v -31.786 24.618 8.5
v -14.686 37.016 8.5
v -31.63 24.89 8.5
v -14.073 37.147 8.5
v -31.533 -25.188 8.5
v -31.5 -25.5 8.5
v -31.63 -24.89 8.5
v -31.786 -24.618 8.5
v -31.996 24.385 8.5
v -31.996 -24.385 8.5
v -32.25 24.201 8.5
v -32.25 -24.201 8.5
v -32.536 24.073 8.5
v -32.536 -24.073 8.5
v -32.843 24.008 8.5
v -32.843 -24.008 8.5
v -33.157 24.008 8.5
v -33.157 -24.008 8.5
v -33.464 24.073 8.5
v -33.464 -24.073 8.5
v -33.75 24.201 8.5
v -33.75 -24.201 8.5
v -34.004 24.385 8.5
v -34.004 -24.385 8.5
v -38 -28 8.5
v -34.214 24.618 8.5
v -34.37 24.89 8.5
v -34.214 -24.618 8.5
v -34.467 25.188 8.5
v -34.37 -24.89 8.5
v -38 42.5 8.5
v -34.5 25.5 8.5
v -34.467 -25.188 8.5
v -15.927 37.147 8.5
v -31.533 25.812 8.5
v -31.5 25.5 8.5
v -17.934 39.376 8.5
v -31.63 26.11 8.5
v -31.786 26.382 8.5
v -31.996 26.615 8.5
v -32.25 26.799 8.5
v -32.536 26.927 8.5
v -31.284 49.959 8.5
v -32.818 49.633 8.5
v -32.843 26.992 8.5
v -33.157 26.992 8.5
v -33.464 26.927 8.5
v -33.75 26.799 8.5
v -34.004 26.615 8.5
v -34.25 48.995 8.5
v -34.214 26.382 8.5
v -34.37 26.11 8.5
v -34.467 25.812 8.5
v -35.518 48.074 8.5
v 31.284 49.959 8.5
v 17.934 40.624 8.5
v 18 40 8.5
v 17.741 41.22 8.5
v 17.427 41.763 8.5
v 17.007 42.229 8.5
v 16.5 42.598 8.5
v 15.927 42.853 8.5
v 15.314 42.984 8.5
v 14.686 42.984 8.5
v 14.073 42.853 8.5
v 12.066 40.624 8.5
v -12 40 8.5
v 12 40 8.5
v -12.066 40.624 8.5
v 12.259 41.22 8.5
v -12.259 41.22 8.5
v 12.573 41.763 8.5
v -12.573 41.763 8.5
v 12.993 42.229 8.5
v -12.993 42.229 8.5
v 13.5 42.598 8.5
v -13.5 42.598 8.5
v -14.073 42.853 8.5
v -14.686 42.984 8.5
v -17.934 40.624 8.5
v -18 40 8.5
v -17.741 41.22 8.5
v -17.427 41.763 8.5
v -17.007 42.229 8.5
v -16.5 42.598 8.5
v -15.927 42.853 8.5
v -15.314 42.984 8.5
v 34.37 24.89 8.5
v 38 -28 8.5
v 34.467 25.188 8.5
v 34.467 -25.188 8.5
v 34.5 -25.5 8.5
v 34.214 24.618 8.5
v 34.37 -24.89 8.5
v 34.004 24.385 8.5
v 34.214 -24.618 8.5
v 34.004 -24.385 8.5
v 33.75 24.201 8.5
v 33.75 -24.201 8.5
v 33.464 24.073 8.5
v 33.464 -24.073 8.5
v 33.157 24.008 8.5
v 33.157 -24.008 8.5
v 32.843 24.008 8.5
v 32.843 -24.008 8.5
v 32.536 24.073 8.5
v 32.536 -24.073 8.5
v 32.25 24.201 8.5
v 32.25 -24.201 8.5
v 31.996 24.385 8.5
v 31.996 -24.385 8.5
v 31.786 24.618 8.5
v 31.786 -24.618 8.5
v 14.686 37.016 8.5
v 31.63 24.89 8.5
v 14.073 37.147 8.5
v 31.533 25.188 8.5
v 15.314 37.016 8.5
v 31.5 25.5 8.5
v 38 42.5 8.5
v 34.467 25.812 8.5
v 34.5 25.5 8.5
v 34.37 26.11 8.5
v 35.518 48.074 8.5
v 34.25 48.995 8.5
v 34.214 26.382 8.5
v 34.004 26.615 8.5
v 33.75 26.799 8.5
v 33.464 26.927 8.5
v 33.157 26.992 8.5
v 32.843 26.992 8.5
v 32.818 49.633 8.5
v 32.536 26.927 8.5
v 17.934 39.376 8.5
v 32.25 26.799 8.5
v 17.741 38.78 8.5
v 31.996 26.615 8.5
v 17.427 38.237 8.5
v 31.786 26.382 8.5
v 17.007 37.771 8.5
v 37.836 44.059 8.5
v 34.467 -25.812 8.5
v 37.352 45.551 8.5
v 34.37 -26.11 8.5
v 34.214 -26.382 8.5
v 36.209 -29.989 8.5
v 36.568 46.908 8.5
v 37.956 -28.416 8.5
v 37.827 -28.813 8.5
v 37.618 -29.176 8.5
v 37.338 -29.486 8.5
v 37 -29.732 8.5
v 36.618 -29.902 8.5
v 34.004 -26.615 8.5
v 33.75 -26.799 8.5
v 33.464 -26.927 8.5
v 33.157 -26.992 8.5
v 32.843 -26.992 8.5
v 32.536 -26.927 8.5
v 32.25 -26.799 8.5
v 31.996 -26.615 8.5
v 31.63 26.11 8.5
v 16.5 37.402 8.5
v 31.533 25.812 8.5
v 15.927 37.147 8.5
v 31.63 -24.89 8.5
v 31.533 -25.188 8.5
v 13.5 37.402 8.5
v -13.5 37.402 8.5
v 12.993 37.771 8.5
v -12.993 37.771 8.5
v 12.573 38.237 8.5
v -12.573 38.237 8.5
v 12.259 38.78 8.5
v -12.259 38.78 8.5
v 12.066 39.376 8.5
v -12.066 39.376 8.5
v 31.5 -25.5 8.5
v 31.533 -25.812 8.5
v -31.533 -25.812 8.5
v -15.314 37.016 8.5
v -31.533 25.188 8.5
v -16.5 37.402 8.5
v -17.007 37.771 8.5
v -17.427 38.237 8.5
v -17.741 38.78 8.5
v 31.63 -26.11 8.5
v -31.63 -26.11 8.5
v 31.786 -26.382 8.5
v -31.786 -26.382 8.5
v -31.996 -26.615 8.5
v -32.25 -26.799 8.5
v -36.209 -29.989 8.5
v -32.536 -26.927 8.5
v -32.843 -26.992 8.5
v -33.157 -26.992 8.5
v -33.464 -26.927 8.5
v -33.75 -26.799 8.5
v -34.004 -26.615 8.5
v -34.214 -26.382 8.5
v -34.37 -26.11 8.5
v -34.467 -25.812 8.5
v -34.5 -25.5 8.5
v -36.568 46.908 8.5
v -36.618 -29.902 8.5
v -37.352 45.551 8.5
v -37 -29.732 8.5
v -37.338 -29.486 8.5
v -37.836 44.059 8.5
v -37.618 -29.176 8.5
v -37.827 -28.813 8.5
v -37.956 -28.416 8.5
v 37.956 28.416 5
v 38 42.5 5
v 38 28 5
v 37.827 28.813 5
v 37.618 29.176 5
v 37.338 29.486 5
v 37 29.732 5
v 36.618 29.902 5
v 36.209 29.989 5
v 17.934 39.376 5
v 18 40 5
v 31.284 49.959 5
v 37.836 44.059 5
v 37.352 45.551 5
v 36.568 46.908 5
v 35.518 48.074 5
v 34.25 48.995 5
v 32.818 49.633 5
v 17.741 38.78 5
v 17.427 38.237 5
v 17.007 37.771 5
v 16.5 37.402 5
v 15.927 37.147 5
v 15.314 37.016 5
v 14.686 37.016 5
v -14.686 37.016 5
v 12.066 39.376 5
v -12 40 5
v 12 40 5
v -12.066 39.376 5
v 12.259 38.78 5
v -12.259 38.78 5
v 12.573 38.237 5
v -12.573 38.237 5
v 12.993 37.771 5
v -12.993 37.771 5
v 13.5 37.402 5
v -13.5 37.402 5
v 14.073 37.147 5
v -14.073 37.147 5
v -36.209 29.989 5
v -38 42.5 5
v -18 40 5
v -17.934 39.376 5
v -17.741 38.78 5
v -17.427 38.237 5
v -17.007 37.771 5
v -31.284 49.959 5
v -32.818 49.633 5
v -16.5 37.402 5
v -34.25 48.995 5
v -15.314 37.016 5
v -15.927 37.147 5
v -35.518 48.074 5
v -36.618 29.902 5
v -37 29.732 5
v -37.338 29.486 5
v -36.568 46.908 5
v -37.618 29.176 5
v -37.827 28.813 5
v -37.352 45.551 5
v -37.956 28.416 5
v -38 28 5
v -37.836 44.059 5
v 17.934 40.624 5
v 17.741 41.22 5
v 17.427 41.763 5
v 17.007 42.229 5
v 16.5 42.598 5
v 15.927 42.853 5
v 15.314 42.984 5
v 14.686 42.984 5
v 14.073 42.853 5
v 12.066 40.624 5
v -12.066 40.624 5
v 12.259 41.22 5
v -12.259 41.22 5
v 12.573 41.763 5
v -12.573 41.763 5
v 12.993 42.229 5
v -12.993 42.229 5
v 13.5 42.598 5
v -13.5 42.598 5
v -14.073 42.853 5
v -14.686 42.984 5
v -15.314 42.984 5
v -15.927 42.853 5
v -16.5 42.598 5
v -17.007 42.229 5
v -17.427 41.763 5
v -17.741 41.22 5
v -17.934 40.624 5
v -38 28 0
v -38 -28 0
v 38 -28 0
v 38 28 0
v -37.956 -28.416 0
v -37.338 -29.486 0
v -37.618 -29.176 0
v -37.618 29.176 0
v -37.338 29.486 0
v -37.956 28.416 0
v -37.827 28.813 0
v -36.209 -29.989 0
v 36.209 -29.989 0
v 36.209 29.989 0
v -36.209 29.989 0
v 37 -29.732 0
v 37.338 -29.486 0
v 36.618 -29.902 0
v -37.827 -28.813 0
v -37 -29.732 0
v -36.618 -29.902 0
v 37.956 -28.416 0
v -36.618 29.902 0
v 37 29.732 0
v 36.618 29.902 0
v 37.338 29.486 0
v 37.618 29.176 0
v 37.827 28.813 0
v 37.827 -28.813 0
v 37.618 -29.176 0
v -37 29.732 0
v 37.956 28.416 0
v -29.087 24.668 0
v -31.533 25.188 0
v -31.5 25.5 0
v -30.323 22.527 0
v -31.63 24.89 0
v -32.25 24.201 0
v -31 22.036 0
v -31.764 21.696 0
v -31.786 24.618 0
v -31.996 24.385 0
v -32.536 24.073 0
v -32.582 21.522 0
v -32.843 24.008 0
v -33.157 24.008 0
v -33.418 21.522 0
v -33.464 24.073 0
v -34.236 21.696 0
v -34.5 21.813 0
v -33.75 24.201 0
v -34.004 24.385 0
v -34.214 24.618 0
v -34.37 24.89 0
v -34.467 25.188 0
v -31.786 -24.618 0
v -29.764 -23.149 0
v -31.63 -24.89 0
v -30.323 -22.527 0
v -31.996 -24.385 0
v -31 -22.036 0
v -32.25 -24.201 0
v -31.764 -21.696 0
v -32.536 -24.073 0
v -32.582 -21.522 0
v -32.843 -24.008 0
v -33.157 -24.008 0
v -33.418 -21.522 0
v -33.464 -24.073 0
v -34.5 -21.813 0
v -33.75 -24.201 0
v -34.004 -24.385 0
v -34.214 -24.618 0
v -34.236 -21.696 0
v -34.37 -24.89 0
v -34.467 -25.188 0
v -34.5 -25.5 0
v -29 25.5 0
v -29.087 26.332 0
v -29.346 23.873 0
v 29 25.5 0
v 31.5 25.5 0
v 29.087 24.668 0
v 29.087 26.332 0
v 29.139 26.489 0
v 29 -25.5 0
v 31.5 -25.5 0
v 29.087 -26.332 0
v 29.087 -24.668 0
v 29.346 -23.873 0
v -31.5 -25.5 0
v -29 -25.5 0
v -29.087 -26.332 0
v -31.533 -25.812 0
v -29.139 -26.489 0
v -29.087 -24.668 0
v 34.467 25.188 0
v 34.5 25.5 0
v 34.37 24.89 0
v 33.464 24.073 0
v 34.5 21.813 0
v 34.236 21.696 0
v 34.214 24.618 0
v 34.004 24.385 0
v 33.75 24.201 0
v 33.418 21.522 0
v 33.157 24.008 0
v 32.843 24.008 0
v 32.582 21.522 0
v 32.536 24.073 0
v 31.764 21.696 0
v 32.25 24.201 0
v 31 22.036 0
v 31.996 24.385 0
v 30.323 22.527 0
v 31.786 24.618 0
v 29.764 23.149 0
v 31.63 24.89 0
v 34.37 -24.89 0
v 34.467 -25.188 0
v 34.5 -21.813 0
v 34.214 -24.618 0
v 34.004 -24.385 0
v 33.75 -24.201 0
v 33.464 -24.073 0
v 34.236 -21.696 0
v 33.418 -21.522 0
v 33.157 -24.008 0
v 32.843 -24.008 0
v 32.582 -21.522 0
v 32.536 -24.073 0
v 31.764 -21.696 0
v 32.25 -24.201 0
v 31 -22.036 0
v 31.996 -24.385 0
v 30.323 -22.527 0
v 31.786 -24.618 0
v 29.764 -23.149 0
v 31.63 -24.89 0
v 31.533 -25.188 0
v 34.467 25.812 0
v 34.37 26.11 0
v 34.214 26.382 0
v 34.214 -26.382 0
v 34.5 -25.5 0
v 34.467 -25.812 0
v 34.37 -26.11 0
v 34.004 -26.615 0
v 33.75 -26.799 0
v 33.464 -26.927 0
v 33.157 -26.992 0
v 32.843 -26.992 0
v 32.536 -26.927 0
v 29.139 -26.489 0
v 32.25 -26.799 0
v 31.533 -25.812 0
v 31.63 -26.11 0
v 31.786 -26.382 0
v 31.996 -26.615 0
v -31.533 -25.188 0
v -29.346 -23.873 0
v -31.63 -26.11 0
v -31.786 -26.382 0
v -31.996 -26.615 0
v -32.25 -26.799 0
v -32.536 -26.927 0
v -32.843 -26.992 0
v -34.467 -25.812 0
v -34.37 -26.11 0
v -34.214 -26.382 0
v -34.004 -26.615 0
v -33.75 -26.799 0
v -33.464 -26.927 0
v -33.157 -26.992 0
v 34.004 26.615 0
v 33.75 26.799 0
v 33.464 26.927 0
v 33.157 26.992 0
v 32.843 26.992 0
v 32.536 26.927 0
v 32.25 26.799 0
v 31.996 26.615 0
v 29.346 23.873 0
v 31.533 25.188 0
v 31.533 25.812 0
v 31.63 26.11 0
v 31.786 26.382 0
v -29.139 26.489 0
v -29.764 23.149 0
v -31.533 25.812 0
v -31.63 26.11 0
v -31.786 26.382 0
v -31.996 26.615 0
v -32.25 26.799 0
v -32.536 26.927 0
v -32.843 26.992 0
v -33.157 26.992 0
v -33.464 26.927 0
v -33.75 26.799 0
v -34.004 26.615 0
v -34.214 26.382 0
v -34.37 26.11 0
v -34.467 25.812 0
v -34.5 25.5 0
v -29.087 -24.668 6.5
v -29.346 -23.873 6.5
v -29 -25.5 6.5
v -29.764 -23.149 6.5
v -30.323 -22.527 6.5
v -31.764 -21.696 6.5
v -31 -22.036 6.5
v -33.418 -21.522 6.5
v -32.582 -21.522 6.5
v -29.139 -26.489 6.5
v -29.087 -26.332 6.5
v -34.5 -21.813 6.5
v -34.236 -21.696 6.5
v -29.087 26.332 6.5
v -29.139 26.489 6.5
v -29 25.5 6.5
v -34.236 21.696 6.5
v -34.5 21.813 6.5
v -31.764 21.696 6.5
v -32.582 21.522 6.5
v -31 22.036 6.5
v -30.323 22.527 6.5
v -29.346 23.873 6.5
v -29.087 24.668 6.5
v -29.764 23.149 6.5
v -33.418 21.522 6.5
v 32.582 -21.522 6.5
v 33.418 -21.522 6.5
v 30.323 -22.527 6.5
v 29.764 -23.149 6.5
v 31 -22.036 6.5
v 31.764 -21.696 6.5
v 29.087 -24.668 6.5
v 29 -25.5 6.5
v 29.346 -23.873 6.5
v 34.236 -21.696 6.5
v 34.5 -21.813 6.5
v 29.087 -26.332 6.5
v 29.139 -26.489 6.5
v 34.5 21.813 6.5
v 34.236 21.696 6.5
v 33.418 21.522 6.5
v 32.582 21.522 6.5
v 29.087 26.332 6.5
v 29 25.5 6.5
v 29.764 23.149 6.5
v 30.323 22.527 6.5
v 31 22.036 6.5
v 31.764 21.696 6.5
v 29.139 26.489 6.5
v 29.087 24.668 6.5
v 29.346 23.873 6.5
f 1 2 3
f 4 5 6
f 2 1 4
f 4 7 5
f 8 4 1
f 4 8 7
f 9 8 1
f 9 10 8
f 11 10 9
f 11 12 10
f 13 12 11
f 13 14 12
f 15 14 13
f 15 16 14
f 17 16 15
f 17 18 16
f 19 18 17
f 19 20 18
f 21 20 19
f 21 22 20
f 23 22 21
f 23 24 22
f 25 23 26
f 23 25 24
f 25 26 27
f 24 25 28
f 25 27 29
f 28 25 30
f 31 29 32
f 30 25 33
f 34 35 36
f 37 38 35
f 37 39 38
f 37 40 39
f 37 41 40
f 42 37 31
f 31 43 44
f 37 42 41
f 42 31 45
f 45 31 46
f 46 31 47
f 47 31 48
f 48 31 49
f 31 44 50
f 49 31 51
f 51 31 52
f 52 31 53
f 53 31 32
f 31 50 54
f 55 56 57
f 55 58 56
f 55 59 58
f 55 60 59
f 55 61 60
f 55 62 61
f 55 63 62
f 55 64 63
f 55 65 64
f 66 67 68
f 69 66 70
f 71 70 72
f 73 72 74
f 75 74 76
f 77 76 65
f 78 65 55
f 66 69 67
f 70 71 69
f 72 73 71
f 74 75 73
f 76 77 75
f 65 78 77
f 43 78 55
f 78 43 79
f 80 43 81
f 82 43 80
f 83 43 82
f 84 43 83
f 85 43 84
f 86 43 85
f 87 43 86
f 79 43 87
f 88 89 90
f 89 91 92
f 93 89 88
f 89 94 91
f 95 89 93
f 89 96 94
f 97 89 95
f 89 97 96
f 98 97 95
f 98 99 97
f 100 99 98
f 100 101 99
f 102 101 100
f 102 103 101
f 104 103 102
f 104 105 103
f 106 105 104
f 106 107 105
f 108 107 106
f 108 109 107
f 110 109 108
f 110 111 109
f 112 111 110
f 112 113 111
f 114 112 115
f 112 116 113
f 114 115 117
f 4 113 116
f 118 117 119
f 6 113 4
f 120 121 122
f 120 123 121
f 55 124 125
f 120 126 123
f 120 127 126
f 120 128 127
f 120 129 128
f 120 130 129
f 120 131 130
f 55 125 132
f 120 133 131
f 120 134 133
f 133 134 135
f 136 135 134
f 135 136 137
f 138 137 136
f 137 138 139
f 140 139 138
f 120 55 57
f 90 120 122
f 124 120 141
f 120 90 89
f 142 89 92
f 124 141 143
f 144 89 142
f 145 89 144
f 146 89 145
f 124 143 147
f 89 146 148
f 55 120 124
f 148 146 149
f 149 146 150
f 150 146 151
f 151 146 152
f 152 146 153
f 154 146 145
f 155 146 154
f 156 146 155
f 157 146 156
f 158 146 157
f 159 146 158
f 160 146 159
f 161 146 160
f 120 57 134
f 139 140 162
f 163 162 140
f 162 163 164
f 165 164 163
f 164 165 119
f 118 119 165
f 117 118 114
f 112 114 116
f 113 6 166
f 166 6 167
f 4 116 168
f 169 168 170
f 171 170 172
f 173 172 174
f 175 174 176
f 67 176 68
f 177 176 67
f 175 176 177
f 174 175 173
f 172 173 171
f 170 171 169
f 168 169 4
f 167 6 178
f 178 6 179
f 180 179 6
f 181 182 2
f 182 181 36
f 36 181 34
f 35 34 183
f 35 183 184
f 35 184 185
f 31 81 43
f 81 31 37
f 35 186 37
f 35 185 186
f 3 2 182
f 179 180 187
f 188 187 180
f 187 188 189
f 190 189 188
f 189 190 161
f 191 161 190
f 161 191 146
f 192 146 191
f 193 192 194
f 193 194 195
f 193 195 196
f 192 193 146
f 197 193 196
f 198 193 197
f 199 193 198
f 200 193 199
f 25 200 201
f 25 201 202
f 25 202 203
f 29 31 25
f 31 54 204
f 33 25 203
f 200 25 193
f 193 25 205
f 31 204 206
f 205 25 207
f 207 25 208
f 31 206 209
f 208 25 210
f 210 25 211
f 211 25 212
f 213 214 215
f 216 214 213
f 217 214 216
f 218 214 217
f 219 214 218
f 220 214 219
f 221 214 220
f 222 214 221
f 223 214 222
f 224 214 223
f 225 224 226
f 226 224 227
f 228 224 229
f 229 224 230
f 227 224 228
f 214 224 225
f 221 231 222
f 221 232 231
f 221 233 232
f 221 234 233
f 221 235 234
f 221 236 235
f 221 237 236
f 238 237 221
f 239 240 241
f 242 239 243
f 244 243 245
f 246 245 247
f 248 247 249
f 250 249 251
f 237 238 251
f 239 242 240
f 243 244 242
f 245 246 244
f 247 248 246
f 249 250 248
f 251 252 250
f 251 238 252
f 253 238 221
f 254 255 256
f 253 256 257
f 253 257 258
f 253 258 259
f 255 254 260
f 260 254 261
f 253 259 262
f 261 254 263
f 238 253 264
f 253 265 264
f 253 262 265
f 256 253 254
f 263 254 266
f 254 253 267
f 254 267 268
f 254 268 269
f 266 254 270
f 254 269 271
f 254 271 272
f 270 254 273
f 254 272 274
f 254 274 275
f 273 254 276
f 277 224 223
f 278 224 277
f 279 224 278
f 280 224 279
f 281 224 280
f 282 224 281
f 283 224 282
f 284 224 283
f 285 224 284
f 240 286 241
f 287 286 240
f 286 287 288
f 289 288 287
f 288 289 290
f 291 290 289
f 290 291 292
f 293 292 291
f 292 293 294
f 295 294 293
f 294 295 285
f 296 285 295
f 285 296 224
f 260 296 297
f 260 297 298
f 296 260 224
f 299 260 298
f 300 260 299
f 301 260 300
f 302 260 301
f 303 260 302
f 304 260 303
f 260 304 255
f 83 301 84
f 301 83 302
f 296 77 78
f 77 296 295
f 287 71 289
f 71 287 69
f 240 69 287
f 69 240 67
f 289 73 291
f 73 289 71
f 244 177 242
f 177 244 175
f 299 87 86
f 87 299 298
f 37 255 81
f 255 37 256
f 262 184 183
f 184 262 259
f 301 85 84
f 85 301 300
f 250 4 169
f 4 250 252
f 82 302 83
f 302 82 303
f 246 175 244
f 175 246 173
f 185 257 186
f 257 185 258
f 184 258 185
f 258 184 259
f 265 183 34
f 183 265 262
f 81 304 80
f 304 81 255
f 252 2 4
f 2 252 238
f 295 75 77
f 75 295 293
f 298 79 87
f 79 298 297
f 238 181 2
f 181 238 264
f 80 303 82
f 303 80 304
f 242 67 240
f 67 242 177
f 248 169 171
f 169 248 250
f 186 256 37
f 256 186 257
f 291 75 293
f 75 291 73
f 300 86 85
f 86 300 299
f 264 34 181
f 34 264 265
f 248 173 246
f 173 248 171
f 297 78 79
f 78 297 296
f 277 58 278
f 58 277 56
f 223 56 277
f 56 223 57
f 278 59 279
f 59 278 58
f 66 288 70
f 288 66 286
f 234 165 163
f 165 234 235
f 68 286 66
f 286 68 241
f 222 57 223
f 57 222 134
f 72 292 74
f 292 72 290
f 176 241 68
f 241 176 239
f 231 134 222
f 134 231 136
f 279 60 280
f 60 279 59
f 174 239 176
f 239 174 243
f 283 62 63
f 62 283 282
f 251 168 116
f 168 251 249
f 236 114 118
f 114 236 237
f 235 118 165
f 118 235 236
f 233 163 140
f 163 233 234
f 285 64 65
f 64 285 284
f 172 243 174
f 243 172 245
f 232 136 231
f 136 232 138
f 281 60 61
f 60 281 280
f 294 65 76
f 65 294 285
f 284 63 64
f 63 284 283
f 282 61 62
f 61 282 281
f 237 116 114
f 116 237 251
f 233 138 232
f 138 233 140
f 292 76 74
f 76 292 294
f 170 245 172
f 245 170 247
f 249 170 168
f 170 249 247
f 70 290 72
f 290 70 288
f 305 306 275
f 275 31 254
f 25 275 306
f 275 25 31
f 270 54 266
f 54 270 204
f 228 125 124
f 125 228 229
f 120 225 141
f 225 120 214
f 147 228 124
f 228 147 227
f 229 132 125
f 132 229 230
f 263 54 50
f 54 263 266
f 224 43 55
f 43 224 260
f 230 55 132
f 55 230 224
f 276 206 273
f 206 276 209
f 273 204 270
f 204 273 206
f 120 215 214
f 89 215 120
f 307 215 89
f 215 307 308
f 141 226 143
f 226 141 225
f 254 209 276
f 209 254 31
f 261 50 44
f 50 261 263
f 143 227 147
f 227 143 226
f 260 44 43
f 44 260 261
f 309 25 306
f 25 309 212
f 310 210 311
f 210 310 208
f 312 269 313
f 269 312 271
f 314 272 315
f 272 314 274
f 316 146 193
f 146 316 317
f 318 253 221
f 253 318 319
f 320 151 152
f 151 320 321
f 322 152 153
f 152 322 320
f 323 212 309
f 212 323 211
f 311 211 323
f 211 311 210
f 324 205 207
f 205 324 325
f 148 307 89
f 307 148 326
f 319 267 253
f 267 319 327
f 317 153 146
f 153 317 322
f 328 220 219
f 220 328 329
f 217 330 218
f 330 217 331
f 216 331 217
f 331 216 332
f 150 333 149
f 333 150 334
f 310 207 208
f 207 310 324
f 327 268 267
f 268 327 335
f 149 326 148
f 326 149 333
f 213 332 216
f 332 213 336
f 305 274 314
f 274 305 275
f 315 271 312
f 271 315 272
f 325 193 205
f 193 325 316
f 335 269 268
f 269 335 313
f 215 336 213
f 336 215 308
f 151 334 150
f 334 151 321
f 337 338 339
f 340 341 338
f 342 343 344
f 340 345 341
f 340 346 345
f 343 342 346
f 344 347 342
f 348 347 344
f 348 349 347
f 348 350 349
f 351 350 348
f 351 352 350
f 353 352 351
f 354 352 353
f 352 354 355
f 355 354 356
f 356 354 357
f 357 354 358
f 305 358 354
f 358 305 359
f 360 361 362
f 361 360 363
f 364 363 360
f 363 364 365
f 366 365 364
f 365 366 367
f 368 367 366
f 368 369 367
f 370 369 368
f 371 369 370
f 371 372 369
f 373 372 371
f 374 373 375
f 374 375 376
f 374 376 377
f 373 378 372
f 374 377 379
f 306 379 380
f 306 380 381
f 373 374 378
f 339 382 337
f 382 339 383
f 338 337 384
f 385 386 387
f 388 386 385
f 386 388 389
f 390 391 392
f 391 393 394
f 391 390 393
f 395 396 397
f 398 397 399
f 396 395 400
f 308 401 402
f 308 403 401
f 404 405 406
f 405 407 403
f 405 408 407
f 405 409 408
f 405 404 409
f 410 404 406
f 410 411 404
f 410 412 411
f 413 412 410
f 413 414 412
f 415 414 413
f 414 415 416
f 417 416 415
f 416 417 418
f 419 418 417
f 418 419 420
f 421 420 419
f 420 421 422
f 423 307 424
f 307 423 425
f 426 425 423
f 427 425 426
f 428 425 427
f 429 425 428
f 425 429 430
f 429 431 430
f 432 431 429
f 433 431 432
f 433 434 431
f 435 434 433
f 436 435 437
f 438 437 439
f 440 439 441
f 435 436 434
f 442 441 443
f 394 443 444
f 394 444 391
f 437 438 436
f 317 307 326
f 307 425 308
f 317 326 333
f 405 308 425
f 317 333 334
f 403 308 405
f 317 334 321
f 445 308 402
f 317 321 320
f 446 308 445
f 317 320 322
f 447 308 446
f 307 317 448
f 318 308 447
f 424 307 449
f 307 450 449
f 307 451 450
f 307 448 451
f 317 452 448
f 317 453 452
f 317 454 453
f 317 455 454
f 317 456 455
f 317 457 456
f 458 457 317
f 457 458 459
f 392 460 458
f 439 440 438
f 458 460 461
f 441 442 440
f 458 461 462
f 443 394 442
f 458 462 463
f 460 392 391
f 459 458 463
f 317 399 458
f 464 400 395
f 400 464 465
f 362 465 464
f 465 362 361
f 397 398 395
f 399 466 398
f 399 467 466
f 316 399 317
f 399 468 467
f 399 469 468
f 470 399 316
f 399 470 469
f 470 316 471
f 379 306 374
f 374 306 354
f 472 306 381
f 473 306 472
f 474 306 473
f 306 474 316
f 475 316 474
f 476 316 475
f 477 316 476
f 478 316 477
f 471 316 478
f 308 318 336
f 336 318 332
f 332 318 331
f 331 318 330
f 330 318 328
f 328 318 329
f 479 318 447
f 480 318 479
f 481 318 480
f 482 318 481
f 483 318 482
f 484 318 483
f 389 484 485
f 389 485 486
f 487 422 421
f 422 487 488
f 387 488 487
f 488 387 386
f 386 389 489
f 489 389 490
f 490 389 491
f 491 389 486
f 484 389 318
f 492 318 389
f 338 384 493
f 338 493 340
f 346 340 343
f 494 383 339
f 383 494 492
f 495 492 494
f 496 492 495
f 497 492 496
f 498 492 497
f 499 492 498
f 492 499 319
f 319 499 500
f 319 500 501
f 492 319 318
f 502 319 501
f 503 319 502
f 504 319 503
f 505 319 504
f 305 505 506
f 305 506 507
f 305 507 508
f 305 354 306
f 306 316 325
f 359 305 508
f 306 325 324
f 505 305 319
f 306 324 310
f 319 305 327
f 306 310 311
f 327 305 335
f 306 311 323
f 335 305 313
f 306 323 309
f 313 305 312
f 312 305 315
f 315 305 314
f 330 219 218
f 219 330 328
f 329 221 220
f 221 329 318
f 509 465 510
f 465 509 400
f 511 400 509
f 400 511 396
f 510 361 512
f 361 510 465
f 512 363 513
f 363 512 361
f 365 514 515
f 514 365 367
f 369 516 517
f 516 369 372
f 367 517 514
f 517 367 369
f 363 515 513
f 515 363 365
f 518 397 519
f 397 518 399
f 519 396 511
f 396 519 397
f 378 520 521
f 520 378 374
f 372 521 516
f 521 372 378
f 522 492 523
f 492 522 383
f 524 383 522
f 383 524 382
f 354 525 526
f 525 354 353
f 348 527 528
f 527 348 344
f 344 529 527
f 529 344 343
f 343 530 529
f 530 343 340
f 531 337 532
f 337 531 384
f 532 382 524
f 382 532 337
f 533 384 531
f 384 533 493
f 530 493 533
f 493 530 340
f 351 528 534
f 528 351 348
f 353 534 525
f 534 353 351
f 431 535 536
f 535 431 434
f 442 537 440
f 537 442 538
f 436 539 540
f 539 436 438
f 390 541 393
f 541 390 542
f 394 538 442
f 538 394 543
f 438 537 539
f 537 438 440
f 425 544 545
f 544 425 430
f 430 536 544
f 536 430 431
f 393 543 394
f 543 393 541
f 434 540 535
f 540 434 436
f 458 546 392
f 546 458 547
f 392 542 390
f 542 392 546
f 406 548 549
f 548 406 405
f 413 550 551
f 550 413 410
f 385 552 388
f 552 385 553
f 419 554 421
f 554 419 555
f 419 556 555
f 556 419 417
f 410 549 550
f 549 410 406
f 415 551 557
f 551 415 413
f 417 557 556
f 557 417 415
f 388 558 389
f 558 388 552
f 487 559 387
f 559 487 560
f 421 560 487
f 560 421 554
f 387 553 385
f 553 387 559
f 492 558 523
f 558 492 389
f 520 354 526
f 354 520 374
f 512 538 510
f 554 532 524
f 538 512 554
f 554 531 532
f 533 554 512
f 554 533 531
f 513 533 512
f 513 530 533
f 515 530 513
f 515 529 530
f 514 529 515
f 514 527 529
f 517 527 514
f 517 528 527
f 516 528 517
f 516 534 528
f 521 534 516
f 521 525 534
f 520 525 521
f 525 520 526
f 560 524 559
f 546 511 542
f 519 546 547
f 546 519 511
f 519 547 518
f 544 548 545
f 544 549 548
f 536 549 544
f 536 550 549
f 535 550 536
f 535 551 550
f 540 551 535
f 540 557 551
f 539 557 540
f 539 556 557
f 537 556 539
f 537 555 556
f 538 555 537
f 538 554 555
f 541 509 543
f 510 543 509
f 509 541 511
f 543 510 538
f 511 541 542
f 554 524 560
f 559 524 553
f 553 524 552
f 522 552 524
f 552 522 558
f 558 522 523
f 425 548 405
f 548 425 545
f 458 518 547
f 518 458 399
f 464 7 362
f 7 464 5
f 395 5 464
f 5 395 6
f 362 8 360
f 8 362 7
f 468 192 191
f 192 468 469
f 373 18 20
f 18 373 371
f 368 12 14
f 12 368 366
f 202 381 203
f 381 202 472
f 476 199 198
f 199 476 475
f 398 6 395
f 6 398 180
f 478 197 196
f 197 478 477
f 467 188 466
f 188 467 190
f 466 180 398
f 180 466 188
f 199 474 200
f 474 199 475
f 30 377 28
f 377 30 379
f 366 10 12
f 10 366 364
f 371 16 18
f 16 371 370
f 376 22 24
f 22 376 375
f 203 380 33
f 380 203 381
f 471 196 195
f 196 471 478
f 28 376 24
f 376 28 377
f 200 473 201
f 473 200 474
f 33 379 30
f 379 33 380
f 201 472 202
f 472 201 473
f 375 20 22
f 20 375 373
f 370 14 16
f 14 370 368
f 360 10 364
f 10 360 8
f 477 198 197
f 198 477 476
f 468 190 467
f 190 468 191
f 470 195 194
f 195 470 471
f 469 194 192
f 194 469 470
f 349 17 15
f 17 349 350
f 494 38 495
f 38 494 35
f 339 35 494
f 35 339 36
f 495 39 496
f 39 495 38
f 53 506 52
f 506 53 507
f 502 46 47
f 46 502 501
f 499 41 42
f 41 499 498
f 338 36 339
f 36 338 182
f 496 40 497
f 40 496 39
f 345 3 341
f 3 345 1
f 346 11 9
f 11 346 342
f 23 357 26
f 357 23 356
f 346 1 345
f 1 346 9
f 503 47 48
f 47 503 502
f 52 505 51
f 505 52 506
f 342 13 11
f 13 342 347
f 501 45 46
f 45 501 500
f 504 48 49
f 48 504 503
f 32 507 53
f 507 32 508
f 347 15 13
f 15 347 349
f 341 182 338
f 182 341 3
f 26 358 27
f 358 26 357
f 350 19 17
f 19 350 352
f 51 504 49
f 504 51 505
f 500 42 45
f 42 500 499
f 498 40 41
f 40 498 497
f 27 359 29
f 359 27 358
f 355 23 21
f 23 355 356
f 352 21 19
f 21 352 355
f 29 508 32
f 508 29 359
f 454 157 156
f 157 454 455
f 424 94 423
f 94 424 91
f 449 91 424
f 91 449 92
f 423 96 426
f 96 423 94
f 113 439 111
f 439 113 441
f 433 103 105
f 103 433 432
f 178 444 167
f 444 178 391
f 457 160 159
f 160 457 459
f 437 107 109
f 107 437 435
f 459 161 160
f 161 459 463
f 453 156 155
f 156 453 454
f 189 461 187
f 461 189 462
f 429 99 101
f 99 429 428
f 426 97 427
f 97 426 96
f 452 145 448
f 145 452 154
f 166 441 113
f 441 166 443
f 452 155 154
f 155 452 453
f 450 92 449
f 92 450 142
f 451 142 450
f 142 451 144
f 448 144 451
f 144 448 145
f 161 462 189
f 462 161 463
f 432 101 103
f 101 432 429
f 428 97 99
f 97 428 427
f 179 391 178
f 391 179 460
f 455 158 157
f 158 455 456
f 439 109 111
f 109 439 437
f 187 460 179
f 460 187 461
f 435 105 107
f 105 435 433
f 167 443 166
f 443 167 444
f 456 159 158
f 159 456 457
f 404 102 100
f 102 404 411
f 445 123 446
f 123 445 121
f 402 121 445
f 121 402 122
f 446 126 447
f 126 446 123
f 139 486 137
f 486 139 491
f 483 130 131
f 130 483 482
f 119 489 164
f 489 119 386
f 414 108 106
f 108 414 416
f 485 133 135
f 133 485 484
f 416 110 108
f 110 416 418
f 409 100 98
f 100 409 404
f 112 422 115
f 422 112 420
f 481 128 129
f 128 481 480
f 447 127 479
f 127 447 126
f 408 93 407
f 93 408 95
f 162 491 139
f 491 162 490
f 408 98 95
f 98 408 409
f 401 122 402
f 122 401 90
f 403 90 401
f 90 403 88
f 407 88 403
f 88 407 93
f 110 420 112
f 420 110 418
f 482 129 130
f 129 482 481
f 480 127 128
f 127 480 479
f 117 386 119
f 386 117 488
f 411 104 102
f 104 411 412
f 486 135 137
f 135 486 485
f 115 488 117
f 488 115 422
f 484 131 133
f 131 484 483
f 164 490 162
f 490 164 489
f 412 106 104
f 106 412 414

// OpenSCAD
WIDTH = 76;
LENGTH = 60;
DEPTH = 8.5;

CORNER_DIA = 4;

WALL_THICKNESS = 3.5;
SIDE_THICKNESS = 2;

HOLE_SPACING_X = 66;
HOLE_SPACING_Y = 51;
HOLE_DIA = 3;
HOLE_SUPPORT_DIA = 8;

IEC_WIDTH = 21;
IEC_LENGTH = 26;
IEC_OFFSET_X = 22;
IEC_OFFSET_Y = 8;

ONOFF_WIDTH = 20;
ONOFF_LENGTH = 12;
ONOFF_OFFSET_X = 22;
ONOFF_OFFSET_Y = -16;

FUSE_DIA = 15;
FUSE_OFFSET_X = -22;
FUSE_OFFSET_Y = 13;

CABLE_DIA = 15;
CABLE_OFFSET_X = -22;
CABLE_OFFSET_Y = -13;

TAB_DEPTH = WALL_THICKNESS;
TAB_WIDTH = 20;
TAB_LENGTH = WIDTH;
TAB_CORNER_DIA = 15;

TAB_HOLE_SPACING_X = 30;
TAB_HOLE_SPACING_Y = 10;
TAB_HOLE_DIA = 6;

$fn = 30;

module mount_holes(w, l, h, dia) {
    for(i = [-1, 1]) {
        for(j = [-1, 1]) {
            translate([i * w/2, j * l/2, 0])
            cylinder(d = dia, h = h);
        }
    }
}

module rounded_rect(w, l, h, corner_dia) {
    hull() {
        mount_holes(w-corner_dia, l-corner_dia, h, corner_dia);
    }
}

module cavity() {
    w = WIDTH - 2 * WALL_THICKNESS;
    l = LENGTH - 2 * WALL_THICKNESS;
    difference() {
        rounded_rect(w, l, DEPTH - SIDE_THICKNESS, CORNER_DIA);
        mount_holes(HOLE_SPACING_X, HOLE_SPACING_Y, DEPTH, HOLE_SUPPORT_DIA);
    }
    #mount_holes(HOLE_SPACING_X, HOLE_SPACING_Y, DEPTH, HOLE_DIA);
}

module ports() {
    #translate([IEC_OFFSET_X, IEC_OFFSET_Y, 0])
    rounded_rect(IEC_WIDTH, IEC_LENGTH, DEPTH, 1);

    #translate([ONOFF_OFFSET_X, ONOFF_OFFSET_Y, 0])
    rounded_rect(ONOFF_WIDTH, ONOFF_LENGTH, DEPTH, 1);

    #translate([FUSE_OFFSET_X, FUSE_OFFSET_Y, 0])
    cylinder(d = FUSE_DIA, h = DEPTH);

    #translate([CABLE_OFFSET_X, CABLE_OFFSET_Y, 0])
    cylinder(d = CABLE_DIA, h = DEPTH);
}

module tab() {
    translate([0, LENGTH/2, DEPTH-TAB_DEPTH])
    difference() {
        rounded_rect(TAB_LENGTH, TAB_WIDTH * 2, TAB_DEPTH, TAB_CORNER_DIA);
        mount_holes(TAB_HOLE_SPACING_X, TAB_HOLE_SPACING_Y * 2, TAB_DEPTH, TAB_HOLE_DIA);
    }
}

module empty_side() {
    difference() {
        union() {
            rounded_rect(WIDTH, LENGTH, DEPTH, CORNER_DIA);
            tab();
        }
        cavity();
    }
}

module port_side() {
    difference() {
        union() {
            rounded_rect(WIDTH, LENGTH, DEPTH, CORNER_DIA);
            tab();
        }
        cavity();
        ports();
    }
}

empty_side();
//port_side();
